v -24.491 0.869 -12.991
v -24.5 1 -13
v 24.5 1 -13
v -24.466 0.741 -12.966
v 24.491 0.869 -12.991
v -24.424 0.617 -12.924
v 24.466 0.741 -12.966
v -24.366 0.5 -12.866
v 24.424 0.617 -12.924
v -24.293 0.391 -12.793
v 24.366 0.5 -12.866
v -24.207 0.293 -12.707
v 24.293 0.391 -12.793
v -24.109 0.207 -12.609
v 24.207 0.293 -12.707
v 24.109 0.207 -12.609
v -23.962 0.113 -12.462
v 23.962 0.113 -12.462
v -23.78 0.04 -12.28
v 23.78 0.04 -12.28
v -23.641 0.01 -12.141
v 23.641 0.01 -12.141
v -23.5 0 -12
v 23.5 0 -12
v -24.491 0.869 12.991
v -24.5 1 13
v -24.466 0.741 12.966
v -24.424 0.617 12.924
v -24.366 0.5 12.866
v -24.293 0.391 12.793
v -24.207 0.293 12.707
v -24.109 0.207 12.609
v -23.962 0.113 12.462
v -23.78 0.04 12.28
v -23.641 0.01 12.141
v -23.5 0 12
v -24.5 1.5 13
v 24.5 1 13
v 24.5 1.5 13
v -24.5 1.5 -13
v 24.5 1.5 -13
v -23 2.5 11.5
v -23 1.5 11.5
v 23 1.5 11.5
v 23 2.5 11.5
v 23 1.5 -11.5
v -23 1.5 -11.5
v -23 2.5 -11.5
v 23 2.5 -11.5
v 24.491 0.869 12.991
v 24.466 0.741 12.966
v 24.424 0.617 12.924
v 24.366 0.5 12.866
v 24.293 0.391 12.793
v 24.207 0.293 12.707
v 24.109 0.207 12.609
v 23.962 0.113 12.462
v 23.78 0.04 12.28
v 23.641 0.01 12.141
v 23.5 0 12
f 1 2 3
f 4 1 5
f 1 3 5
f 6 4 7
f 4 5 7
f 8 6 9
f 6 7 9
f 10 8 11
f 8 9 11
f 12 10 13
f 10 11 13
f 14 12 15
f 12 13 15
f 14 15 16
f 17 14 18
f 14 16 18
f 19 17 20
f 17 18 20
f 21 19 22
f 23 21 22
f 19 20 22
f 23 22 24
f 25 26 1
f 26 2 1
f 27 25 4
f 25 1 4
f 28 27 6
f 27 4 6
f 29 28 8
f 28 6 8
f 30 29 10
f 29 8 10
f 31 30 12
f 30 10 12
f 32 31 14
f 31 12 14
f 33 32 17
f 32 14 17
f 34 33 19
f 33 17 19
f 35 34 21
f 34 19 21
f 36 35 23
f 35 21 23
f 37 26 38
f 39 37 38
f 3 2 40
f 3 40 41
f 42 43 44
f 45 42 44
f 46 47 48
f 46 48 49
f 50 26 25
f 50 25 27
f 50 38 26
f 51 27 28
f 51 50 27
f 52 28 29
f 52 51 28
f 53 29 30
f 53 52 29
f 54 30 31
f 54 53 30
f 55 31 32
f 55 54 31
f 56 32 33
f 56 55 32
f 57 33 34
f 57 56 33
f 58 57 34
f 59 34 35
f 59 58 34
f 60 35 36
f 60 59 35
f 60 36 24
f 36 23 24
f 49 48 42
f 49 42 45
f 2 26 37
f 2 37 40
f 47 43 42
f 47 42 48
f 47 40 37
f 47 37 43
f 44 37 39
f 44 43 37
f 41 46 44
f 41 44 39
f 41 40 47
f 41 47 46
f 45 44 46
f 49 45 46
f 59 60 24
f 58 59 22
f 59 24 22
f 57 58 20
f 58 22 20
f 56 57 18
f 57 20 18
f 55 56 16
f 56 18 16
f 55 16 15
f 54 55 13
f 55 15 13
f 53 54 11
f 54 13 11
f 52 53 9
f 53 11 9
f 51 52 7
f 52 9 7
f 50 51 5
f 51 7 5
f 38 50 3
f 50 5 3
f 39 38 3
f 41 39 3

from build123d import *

# Parameters (mm, degrees)
SKETCH_1_W      = 49
SKETCH_1_H      = 26
EXTRUDE_1_DEPTH = 1.5
SKETCH_2_W      = 46
SKETCH_2_H      = 23
EXTRUDE_2_DEPTH = 1
FILLET_1_R      = 1


with BuildPart() as part:
    # 草图1 → 凸台-拉伸1 (new body)
    with BuildSketch(Plane(origin=(0, 0, 0), x_dir=(1, 0, 0), z_dir=(0, 1, 0))):
        Rectangle(SKETCH_1_W, SKETCH_1_H)
    extrude(amount=EXTRUDE_1_DEPTH)

    # 草图2 → 凸台-拉伸2 (add)
    with BuildSketch(Plane(origin=(0, 1.5, 0), x_dir=(1, 0, 0), z_dir=(0, 1, 0))):
        Rectangle(SKETCH_2_W, SKETCH_2_H)
    extrude(amount=EXTRUDE_2_DEPTH)

    # 圆角1
    fillet_1_edges = [part.edges().sort_by_distance(p)[0] for p in [
        (0, 0, 13),
        (-24.5, 0, 0),
        (0, 0, -13),
        (24.5, 0, 0),
    ]]
    fillet(fillet_1_edges, radius=FILLET_1_R)


solid = part.part
